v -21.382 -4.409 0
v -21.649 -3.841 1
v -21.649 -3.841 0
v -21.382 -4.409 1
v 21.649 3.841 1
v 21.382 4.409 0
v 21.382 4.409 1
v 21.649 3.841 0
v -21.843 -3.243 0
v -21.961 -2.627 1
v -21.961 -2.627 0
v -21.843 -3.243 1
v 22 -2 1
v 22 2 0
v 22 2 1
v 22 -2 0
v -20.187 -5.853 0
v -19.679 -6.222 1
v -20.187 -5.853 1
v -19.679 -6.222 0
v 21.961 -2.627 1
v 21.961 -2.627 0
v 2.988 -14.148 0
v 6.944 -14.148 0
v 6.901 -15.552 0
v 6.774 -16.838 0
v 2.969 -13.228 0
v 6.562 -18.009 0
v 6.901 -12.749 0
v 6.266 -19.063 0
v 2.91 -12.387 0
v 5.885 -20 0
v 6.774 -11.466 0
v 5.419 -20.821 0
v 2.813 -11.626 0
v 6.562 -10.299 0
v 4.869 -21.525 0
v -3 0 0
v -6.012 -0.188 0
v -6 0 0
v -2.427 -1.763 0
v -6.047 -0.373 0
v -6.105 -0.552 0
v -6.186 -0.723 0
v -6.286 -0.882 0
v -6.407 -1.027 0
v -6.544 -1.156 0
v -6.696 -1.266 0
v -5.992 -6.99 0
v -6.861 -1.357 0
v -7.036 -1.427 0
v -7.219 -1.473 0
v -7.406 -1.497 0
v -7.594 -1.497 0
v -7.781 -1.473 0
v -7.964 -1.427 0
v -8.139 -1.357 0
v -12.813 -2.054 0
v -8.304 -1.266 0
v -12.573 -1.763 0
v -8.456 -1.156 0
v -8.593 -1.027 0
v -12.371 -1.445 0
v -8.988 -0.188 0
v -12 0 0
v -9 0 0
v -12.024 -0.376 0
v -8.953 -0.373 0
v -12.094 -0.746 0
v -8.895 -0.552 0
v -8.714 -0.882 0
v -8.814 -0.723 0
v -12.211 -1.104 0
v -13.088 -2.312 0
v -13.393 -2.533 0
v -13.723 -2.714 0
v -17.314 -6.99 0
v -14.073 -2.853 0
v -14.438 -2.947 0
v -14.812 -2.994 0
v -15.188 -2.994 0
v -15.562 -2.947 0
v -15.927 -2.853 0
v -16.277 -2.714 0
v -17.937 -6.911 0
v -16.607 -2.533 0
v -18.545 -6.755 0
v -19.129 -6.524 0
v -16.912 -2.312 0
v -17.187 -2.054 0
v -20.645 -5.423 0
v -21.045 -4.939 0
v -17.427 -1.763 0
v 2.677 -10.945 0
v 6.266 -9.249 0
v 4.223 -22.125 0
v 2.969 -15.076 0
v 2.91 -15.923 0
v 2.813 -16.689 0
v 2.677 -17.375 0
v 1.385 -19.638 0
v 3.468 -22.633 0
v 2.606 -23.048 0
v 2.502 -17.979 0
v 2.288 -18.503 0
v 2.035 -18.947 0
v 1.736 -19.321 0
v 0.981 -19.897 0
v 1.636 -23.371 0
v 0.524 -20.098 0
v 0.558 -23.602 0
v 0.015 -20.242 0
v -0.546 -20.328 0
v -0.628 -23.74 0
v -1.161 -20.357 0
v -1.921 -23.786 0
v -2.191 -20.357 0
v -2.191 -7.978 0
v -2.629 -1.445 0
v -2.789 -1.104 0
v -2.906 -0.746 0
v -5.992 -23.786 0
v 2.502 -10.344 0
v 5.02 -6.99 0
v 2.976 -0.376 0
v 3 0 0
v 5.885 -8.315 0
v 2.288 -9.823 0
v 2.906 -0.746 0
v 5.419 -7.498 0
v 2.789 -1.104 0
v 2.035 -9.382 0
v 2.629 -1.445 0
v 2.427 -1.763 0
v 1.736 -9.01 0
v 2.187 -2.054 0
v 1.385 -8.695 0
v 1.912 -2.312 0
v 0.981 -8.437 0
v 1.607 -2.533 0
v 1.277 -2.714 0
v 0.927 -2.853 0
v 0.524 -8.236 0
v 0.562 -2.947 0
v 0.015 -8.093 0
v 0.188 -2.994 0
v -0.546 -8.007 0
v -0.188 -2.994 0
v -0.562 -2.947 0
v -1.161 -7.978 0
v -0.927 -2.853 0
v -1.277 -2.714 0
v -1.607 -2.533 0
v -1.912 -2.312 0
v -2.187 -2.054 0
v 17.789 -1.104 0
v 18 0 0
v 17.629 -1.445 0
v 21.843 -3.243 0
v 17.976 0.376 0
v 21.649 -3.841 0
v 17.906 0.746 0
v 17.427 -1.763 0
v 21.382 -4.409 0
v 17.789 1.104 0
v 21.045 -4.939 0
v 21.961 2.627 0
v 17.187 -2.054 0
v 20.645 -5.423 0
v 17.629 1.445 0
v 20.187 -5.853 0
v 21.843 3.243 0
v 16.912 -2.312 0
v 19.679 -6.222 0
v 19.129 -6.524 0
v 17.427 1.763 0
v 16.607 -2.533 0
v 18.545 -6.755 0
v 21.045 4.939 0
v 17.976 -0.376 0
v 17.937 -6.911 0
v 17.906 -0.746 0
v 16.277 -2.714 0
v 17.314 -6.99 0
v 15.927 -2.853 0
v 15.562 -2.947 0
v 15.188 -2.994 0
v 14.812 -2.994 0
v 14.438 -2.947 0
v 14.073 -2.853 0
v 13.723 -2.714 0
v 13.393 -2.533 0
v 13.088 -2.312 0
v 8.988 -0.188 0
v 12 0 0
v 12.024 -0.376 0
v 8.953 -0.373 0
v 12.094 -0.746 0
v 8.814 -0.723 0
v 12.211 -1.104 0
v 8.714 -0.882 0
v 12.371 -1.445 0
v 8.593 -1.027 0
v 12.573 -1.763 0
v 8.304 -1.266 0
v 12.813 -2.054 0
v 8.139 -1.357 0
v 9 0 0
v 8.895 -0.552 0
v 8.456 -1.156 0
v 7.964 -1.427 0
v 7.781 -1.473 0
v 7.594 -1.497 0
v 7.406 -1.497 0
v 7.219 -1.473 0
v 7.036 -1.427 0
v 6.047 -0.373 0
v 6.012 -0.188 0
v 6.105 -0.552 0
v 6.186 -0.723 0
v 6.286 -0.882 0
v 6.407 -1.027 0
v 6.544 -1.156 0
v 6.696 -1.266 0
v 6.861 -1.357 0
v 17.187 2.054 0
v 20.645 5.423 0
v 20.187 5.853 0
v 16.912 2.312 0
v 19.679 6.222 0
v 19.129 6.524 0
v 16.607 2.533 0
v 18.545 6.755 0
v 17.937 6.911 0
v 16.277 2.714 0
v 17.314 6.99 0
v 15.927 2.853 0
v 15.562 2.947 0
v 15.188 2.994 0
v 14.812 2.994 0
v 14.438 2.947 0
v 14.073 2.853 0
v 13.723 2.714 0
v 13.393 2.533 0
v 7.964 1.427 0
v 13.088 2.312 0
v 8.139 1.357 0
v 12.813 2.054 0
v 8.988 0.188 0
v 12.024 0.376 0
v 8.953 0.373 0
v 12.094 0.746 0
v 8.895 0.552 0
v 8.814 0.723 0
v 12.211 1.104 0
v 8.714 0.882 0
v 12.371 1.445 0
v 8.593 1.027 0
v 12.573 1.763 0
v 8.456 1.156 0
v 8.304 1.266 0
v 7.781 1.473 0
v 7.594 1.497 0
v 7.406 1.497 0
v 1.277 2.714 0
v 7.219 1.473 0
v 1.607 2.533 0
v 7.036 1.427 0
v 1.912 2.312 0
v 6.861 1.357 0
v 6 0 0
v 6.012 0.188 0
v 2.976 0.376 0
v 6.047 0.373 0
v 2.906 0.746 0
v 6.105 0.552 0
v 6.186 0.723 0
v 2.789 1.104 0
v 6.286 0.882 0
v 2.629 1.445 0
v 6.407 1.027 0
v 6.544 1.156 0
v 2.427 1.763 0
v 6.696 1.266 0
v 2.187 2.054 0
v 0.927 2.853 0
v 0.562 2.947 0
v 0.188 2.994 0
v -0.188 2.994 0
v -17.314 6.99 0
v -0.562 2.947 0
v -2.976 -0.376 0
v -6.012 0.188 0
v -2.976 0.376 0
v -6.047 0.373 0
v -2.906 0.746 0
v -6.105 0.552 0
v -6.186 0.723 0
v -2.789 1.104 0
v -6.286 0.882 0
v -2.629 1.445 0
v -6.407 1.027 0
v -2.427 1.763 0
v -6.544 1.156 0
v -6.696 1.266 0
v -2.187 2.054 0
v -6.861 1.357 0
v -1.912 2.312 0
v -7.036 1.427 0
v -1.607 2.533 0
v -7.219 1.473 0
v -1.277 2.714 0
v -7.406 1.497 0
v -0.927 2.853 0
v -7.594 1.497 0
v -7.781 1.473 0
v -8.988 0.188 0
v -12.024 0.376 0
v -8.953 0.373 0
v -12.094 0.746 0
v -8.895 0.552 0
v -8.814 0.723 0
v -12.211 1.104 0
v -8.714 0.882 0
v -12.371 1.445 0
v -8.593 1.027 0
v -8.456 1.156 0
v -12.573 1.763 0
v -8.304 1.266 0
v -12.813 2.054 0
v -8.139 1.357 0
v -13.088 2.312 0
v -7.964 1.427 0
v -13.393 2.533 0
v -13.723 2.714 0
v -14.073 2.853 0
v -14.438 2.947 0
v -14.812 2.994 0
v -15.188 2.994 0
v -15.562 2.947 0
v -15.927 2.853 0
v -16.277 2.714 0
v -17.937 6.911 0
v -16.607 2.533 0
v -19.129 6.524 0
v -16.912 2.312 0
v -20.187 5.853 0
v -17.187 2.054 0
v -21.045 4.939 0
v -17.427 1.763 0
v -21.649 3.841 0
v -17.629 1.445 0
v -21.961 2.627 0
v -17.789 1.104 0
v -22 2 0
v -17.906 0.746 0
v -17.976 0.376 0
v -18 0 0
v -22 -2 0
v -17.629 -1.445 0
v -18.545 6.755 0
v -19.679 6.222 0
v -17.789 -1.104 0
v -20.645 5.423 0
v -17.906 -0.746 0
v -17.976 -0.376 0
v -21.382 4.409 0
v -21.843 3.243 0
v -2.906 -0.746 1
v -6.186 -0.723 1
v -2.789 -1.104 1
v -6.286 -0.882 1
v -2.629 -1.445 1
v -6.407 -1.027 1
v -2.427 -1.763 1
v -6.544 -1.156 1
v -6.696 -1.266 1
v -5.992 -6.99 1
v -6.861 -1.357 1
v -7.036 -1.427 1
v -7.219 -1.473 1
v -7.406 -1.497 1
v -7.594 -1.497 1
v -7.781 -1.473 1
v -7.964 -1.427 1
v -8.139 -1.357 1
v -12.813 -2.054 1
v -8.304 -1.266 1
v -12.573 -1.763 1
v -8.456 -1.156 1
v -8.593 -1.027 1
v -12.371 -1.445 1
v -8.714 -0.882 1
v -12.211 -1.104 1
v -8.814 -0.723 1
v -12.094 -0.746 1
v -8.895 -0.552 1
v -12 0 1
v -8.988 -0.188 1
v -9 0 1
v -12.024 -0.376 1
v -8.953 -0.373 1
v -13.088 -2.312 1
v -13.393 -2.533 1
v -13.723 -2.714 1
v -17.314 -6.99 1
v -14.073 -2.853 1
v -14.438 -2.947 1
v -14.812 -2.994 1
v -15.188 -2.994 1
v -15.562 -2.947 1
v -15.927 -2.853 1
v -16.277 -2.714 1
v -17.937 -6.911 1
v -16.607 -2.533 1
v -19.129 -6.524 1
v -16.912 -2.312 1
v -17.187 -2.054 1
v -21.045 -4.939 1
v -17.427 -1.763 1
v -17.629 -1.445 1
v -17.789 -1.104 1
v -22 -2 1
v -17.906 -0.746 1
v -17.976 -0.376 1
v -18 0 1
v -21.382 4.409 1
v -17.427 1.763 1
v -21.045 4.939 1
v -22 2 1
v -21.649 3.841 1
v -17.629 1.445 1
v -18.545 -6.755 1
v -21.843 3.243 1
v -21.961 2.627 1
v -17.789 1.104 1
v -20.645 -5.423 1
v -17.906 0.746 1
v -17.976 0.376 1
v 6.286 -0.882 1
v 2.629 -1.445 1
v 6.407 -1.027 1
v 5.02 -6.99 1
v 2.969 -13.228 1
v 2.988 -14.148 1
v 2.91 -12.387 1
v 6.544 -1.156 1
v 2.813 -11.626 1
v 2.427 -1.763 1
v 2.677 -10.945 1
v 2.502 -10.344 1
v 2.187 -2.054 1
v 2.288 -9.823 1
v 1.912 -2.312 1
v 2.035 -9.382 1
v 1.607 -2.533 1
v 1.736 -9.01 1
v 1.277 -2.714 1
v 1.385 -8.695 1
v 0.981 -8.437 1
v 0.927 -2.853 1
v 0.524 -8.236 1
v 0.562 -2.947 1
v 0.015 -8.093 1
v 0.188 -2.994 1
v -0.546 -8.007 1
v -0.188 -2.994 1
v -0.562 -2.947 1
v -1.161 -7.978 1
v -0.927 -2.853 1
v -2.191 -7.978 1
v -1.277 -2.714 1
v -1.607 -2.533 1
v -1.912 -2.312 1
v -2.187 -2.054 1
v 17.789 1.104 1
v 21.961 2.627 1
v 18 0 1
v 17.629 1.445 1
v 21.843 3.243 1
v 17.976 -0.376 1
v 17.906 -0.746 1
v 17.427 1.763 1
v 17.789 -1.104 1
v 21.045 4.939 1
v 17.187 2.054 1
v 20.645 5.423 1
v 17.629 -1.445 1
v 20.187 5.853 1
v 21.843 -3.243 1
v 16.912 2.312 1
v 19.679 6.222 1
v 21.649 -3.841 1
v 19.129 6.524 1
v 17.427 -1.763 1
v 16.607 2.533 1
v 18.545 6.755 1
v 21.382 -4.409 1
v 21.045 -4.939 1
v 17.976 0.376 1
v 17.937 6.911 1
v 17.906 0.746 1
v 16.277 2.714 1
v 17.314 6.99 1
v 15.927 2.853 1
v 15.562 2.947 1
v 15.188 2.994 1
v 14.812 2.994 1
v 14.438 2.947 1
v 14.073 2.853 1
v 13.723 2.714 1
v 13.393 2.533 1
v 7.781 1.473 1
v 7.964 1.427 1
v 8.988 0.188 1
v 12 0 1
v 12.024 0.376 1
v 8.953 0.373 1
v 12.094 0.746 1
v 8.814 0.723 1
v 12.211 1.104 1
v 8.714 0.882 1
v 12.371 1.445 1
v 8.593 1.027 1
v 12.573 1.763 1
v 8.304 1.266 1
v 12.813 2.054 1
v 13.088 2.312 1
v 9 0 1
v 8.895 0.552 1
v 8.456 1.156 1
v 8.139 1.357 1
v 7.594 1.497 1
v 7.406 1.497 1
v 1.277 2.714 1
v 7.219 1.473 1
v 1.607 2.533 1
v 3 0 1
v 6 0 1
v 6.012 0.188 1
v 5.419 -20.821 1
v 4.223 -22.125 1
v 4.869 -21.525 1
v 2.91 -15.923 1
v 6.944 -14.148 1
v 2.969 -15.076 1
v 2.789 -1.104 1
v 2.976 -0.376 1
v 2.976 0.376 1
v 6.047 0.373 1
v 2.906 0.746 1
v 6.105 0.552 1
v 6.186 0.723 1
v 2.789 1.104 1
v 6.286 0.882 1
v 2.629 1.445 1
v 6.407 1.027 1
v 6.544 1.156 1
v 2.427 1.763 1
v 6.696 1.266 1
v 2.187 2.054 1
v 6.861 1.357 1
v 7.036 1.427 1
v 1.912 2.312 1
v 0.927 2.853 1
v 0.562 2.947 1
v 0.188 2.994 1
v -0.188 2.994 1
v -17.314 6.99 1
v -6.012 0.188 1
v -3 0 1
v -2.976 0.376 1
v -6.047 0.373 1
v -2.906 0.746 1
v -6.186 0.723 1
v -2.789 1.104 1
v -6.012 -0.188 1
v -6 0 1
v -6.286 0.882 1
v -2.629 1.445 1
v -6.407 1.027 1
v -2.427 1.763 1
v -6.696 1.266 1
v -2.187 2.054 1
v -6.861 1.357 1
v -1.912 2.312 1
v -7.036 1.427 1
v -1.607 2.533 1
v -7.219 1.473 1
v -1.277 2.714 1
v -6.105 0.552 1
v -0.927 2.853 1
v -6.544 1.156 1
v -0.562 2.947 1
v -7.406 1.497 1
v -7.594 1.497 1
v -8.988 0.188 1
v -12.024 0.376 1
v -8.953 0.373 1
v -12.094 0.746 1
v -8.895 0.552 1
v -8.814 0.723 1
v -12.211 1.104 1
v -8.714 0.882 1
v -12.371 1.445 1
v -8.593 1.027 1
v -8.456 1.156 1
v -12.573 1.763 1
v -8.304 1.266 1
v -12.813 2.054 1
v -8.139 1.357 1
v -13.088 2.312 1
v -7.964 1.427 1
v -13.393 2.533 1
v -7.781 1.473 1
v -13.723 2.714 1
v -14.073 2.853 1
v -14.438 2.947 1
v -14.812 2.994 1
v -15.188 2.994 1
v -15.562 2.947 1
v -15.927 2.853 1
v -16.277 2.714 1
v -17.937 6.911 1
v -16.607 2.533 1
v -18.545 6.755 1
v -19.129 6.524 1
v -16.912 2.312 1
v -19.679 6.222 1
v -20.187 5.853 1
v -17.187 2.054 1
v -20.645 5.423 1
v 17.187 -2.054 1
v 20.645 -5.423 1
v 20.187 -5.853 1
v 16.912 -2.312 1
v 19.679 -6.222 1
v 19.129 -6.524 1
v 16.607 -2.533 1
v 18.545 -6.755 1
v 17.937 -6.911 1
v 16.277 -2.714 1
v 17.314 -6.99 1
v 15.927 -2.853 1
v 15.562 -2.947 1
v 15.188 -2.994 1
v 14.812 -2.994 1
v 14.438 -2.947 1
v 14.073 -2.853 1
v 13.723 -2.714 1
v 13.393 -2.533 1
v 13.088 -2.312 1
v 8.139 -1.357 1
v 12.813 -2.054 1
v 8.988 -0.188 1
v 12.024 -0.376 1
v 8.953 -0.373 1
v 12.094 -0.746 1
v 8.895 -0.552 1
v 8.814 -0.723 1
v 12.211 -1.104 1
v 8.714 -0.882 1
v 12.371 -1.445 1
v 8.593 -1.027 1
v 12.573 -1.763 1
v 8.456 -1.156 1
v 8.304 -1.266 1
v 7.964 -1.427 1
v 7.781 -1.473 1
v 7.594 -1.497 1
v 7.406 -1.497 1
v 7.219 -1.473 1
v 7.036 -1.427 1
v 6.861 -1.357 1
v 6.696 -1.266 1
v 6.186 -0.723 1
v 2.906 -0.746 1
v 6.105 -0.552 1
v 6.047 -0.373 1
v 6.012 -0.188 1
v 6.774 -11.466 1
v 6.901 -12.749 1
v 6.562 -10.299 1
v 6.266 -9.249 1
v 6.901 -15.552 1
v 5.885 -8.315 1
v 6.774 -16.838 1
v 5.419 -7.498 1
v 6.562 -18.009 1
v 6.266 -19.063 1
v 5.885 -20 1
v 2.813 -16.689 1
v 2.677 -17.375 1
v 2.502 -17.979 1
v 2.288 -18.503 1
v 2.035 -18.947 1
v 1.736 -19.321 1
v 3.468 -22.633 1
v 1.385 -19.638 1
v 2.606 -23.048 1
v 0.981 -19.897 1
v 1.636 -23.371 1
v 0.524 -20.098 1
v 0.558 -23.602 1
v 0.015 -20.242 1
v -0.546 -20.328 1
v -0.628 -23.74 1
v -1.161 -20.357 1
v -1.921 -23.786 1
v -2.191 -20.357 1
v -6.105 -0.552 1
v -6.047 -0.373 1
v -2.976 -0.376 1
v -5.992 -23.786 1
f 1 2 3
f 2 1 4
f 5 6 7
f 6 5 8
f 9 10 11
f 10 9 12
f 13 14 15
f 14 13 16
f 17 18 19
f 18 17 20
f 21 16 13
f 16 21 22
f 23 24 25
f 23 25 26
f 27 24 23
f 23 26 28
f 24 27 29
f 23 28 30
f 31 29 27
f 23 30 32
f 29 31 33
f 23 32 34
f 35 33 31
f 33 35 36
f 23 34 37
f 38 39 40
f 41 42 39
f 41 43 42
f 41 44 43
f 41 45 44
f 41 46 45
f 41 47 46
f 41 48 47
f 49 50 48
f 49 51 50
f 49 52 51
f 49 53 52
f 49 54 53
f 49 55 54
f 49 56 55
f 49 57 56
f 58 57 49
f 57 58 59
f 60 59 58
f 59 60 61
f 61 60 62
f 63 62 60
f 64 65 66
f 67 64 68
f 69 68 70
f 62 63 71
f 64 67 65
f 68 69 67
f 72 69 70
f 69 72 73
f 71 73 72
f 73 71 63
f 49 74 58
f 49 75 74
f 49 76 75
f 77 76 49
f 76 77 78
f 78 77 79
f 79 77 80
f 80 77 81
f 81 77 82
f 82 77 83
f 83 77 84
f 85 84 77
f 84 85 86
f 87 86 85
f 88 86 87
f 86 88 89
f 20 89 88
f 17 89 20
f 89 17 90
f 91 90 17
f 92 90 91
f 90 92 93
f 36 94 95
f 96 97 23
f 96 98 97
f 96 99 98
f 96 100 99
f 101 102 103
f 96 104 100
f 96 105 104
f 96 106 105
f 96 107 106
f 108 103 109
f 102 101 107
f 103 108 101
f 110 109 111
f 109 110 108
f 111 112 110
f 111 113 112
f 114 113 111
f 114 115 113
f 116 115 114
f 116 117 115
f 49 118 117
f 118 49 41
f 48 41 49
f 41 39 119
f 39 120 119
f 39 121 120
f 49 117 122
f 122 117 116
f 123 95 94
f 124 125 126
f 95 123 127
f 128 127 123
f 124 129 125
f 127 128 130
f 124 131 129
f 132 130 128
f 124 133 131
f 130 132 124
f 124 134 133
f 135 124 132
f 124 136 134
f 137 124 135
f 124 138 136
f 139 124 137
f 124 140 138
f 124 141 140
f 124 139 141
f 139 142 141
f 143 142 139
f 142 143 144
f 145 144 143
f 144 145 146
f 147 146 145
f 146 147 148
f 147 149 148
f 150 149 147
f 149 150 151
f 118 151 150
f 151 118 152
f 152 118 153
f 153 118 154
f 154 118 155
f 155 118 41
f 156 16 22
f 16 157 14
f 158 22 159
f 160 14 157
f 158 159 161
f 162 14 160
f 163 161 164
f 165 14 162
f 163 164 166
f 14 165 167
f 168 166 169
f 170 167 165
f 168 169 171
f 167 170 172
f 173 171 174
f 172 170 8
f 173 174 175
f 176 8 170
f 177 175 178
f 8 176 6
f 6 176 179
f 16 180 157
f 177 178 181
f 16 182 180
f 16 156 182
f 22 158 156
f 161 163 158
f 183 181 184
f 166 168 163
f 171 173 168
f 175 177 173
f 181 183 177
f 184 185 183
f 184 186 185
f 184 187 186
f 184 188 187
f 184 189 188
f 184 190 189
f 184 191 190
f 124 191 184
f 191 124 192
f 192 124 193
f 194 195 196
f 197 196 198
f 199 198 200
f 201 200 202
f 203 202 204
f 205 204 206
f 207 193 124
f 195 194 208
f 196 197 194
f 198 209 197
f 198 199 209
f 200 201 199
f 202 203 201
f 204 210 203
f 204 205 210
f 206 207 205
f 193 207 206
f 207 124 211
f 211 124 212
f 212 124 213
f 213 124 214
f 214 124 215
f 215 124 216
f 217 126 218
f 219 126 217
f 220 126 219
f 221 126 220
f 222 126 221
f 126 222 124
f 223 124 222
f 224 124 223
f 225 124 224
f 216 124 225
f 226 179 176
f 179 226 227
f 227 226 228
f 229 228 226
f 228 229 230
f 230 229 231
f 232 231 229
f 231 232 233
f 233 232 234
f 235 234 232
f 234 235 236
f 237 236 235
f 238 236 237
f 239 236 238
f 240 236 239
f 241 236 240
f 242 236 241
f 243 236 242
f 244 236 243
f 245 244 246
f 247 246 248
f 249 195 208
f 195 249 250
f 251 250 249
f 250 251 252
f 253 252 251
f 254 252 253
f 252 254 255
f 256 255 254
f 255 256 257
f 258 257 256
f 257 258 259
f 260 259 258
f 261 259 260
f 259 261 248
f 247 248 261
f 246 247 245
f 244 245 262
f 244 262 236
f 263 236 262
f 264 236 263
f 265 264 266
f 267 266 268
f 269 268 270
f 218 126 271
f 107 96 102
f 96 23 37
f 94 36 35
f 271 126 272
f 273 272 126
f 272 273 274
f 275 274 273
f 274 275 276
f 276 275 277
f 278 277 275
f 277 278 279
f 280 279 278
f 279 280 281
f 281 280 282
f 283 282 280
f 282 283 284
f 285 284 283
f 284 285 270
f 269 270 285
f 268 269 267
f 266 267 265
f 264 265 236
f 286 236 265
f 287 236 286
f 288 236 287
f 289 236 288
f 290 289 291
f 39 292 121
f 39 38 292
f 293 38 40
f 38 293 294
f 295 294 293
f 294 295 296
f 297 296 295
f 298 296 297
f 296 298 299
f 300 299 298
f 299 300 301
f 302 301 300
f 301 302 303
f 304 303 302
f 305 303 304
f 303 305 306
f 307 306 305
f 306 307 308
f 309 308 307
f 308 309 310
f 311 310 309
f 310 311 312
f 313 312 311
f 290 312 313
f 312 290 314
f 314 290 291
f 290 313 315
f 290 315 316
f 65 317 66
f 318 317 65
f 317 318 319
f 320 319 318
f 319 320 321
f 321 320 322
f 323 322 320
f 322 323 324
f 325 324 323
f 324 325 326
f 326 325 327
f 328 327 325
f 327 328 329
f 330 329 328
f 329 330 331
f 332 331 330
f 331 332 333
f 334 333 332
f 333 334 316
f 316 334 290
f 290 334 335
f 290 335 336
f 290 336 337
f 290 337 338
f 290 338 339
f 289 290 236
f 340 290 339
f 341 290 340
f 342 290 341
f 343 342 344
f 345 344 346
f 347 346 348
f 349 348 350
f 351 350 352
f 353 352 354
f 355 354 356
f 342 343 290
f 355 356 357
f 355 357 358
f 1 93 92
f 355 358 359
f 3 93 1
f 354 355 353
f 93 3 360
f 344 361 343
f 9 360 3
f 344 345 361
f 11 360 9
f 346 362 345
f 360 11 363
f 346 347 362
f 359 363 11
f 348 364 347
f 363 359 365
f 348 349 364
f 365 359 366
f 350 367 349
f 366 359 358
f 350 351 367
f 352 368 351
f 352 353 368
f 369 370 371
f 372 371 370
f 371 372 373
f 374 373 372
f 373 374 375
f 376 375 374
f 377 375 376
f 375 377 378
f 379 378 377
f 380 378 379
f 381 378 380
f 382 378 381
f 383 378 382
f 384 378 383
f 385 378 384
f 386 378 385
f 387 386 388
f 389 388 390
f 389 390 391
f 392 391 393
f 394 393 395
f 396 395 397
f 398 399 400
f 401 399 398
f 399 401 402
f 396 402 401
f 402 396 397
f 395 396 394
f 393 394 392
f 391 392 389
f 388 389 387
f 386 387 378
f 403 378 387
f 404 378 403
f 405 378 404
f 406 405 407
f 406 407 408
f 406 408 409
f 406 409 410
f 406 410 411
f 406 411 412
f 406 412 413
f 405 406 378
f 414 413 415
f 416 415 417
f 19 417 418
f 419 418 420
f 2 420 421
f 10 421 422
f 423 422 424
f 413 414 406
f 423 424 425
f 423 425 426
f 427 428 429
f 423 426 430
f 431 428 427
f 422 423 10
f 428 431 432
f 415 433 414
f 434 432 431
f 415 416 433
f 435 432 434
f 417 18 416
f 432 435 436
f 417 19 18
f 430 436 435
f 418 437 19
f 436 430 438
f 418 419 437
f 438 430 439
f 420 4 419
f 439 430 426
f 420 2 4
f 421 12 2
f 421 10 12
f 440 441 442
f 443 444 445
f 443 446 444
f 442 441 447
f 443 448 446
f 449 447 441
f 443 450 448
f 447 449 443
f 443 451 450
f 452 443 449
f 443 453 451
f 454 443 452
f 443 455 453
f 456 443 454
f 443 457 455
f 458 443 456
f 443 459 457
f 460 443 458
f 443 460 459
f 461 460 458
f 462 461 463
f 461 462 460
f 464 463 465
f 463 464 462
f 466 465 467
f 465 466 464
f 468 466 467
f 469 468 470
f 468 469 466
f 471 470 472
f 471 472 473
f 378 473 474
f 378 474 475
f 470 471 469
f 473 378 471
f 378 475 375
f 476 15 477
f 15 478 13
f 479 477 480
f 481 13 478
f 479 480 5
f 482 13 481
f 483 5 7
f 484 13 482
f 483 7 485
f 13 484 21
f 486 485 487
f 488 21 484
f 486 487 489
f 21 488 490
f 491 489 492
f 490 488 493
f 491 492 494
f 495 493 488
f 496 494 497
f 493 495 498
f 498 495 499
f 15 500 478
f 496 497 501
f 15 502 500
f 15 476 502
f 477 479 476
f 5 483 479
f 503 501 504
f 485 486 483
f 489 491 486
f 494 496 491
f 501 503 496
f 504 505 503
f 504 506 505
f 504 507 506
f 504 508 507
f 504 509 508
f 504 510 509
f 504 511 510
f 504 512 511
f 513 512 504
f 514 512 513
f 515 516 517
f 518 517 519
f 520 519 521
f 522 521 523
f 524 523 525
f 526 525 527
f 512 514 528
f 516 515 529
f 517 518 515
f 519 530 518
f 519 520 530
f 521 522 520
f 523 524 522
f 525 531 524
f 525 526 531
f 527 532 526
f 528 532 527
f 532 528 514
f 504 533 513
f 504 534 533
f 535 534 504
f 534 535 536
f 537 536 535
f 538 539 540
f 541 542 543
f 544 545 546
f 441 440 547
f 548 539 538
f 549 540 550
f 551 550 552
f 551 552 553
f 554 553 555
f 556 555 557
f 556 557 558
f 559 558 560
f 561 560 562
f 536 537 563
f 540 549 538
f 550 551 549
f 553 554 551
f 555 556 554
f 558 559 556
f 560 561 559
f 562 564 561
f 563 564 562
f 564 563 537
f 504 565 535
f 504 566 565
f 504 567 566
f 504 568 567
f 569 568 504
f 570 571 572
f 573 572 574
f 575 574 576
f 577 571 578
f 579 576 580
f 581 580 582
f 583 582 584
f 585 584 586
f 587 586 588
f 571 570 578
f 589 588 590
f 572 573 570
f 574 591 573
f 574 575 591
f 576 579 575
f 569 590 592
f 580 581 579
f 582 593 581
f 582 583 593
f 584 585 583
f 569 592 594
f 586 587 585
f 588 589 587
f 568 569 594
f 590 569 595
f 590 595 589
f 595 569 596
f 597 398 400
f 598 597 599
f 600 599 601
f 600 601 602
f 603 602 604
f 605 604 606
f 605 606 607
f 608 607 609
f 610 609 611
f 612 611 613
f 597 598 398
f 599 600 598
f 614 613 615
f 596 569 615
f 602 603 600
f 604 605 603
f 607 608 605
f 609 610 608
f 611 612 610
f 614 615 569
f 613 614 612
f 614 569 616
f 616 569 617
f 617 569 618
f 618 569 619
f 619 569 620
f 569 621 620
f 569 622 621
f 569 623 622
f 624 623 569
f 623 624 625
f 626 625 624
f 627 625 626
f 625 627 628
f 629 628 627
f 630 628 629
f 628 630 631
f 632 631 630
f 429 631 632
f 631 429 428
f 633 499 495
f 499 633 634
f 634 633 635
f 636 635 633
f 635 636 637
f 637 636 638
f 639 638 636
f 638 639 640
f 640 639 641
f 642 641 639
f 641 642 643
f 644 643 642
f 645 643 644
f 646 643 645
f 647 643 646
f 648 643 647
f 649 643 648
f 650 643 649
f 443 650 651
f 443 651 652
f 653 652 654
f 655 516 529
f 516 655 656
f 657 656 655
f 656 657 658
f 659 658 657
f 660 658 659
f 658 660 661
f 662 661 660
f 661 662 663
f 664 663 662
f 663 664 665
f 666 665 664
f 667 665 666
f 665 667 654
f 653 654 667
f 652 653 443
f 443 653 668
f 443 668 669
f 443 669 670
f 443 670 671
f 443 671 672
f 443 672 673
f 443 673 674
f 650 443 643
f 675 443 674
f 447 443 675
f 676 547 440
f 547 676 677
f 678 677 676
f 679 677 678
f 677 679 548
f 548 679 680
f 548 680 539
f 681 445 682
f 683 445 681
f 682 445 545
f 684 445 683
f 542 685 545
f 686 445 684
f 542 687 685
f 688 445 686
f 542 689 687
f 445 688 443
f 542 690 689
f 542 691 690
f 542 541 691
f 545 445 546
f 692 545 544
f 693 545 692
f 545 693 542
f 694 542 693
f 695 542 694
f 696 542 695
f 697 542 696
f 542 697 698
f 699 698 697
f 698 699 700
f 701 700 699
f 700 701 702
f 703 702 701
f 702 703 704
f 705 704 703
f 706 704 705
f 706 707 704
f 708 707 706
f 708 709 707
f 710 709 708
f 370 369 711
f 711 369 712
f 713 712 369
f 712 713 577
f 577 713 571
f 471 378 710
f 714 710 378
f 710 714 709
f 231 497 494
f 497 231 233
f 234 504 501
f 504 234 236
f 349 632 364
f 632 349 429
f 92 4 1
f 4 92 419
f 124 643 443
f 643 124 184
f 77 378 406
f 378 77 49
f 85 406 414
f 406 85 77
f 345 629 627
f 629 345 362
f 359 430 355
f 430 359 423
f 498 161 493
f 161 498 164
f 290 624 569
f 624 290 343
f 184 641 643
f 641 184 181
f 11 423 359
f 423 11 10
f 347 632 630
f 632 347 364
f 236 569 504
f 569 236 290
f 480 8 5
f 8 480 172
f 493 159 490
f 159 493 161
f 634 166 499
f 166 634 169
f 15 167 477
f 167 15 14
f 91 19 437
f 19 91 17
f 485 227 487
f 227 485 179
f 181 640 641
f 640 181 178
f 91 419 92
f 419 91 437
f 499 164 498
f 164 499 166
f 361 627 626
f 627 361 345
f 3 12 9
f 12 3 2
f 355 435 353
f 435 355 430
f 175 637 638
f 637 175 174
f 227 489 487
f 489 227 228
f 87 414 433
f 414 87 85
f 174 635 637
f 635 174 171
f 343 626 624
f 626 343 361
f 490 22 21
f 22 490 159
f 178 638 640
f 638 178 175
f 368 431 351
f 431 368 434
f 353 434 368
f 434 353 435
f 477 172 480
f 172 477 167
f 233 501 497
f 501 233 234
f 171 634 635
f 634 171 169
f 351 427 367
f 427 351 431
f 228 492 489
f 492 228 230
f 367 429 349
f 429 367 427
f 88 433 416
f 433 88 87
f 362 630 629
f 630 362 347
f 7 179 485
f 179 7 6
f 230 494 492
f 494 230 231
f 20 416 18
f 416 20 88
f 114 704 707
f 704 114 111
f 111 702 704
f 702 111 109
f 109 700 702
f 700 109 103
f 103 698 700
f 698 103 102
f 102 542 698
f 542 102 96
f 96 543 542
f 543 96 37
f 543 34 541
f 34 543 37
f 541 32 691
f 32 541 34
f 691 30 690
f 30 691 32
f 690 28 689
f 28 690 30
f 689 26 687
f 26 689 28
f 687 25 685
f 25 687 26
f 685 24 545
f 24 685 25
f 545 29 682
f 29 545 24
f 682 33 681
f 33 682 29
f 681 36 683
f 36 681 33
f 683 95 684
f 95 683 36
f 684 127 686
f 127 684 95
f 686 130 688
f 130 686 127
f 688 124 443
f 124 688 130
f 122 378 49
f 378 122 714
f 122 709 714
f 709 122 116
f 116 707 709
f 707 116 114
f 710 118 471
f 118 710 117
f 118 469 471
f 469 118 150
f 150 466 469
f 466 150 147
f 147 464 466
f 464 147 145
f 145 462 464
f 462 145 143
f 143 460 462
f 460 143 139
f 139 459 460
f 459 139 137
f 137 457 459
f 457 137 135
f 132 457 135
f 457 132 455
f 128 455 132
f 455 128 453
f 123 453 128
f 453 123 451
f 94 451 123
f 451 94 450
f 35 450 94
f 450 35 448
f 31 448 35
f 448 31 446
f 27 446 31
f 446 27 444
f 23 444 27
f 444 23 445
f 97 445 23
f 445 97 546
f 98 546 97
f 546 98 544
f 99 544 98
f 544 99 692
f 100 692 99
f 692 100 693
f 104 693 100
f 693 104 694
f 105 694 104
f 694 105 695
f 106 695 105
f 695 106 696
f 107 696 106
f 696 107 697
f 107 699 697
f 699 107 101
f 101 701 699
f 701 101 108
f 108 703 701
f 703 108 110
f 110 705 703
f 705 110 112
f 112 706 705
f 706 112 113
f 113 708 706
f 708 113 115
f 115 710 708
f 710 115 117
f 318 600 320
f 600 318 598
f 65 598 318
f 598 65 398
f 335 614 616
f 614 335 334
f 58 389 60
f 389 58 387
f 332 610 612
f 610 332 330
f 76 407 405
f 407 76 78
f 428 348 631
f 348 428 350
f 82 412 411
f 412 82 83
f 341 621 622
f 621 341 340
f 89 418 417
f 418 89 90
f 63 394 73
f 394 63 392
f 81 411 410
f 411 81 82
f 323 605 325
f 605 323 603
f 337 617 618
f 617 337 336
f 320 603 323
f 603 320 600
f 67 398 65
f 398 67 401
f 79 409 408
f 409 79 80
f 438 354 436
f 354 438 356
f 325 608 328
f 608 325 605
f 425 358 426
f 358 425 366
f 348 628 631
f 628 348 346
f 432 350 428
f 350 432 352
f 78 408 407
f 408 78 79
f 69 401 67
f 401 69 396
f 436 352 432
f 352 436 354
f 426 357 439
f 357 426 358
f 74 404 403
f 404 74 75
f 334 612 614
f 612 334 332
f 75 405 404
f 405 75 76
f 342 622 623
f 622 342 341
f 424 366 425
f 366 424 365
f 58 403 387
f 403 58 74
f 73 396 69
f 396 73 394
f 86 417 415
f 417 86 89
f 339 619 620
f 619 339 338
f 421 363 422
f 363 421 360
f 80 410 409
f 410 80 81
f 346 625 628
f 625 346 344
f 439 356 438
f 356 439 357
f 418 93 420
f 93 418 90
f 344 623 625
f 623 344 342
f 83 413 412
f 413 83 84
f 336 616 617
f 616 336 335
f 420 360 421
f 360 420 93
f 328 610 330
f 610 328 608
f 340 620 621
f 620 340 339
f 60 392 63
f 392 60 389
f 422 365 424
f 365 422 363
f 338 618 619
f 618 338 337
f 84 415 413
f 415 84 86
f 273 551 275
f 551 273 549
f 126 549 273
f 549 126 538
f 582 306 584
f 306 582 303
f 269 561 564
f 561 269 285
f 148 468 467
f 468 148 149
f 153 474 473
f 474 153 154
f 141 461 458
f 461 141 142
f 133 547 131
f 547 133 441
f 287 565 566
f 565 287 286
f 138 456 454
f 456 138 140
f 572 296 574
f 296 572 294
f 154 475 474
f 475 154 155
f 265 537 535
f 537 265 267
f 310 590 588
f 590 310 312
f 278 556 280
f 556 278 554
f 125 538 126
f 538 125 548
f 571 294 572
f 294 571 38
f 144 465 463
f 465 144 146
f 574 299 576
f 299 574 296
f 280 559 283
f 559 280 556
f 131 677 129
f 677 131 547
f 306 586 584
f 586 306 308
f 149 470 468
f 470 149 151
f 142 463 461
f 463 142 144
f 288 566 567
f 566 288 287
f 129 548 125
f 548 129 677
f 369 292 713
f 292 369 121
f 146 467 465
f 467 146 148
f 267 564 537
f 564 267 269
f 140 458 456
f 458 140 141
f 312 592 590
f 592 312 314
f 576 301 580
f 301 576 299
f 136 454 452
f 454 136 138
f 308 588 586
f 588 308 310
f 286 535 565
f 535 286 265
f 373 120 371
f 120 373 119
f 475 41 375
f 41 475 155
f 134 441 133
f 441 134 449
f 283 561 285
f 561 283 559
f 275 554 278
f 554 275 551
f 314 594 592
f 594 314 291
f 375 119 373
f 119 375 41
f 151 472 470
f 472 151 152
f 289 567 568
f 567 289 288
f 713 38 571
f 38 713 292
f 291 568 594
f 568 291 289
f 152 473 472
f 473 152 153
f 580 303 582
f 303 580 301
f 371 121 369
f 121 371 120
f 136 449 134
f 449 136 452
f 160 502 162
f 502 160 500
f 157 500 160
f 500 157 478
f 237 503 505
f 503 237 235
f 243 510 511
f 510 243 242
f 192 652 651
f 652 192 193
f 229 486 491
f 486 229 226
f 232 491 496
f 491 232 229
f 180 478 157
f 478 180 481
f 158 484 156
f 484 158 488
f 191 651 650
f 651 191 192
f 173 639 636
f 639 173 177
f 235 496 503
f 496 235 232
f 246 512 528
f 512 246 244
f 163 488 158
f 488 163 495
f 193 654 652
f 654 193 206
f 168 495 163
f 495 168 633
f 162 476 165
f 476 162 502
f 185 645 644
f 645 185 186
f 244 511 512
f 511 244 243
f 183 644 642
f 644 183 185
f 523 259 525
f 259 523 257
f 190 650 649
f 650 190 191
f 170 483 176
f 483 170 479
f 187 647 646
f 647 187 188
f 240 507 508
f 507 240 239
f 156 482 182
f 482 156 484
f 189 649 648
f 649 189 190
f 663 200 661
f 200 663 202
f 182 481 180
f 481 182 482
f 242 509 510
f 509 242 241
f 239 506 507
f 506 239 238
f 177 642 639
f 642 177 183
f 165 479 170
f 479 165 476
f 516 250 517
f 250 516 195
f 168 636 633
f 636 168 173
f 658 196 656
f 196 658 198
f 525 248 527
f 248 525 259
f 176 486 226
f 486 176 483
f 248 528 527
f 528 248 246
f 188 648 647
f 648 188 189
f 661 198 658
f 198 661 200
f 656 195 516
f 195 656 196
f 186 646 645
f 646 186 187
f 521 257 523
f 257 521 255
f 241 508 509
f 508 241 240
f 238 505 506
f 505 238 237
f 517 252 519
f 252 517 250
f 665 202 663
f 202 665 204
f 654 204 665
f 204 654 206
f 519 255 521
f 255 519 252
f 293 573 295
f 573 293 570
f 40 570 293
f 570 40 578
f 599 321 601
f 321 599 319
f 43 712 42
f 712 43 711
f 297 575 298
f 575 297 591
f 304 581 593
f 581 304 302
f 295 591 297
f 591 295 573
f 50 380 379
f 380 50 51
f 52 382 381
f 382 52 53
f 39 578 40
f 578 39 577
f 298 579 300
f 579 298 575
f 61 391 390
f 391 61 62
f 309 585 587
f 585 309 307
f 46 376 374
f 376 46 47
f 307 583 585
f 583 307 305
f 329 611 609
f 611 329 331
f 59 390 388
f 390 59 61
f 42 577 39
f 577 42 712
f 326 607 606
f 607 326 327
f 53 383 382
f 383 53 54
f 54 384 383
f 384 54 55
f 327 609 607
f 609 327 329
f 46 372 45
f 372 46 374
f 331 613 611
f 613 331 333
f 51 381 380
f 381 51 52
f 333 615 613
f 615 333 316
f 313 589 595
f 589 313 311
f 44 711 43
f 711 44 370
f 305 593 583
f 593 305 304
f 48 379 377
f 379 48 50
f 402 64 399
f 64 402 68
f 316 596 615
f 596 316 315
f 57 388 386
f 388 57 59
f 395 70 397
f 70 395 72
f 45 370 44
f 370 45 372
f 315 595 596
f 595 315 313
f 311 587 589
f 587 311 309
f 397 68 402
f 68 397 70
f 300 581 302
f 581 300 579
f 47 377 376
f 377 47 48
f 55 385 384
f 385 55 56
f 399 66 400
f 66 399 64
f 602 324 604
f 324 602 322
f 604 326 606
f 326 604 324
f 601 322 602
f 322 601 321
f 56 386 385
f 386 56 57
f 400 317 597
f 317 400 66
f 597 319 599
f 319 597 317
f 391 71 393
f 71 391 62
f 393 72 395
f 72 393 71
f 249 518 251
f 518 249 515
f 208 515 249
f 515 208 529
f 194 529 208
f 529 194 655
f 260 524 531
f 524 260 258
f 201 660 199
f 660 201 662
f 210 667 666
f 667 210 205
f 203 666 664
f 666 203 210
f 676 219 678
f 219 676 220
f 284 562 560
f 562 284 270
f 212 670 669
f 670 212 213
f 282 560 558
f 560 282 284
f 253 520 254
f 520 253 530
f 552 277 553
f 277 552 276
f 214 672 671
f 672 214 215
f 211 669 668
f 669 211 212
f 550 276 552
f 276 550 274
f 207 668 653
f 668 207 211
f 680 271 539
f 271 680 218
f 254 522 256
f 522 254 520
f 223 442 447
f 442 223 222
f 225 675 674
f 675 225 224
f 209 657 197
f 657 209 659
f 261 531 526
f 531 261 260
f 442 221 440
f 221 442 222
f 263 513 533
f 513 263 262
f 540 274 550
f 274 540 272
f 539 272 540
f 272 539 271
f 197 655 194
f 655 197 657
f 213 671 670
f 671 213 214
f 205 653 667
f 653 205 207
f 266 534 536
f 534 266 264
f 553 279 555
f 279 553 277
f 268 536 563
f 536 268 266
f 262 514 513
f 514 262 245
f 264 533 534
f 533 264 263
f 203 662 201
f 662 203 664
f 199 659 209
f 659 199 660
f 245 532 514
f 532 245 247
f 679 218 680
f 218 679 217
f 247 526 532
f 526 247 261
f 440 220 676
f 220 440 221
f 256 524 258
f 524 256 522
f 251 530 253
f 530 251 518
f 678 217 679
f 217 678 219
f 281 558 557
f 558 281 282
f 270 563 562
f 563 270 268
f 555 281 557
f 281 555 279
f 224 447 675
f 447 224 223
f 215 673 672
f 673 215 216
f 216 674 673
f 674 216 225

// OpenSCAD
$fn = 50;


difference() {
	union() {
		*color(alpha = 1.0000000000, c = "gray") {
			translate(v = [0, 14, 0]) {
				linear_extrude(height = 1) {
					text(font = "Arial:style=Bold", halign = "center", size = 4.5000000000, text = "COMMENT description oobb_plate_shape_p_type_1_depth_3_width_1_thickness_d_extra_oobb_size", valign = "center");
				}
			}
		}
		hull() {
			translate(v = [-17.0000000000, 2.0000000000, 0]) {
				cylinder(h = 1, r = 5);
			}
			translate(v = [17.0000000000, 2.0000000000, 0]) {
				cylinder(h = 1, r = 5);
			}
			translate(v = [-17.0000000000, -2.0000000000, 0]) {
				cylinder(h = 1, r = 5);
			}
			translate(v = [17.0000000000, -2.0000000000, 0]) {
				cylinder(h = 1, r = 5);
			}
		}
		translate(v = [0, -5, 0]) {
			linear_extrude(height = 1) {
				text(font = "DejaVu Sans Mono:style=Bold", halign = "center", size = 19.0000000000, text = "D", valign = "top");
			}
		}
	}
	union() {
		*color(alpha = 1.0000000000, c = "gray") {
			translate(v = [0, 14, 0]) {
				linear_extrude(height = 1) {
					text(font = "Arial:style=Bold", halign = "center", size = 4.5000000000, text = "COMMENT description oobb_holes_shape_n_type_3_width_1_thickness_d_extra_oobb_size_1_height_'all'_holes_true_both_holes", valign = "center");
				}
			}
		}
		translate(v = [-15.0000000000, 0.0000000000, 0]) {
			translate(v = [0, 0, -50]) {
				cylinder(h = 100, r = 3.0000000000);
			}
		}
		translate(v = [0, 0, -50]) {
			cylinder(h = 100, r = 3.0000000000);
		}
		translate(v = [15.0000000000, 0.0000000000, 0]) {
			translate(v = [0, 0, -50]) {
				cylinder(h = 100, r = 3.0000000000);
			}
		}
		translate(v = [-15.0000000000, 0.0000000000, 0]) {
			translate(v = [0, 0, -50]) {
				cylinder(h = 100, r = 1.5000000000);
			}
		}
		translate(v = [-7.5000000000, 0.0000000000, 0]) {
			translate(v = [0, 0, -50]) {
				cylinder(h = 100, r = 1.5000000000);
			}
		}
		translate(v = [0, 0, -50]) {
			cylinder(h = 100, r = 1.5000000000);
		}
		translate(v = [7.5000000000, 0.0000000000, 0]) {
			translate(v = [0, 0, -50]) {
				cylinder(h = 100, r = 1.5000000000);
			}
		}
		translate(v = [15.0000000000, 0.0000000000, 0]) {
			translate(v = [0, 0, -50]) {
				cylinder(h = 100, r = 1.5000000000);
			}
		}
	}
}
